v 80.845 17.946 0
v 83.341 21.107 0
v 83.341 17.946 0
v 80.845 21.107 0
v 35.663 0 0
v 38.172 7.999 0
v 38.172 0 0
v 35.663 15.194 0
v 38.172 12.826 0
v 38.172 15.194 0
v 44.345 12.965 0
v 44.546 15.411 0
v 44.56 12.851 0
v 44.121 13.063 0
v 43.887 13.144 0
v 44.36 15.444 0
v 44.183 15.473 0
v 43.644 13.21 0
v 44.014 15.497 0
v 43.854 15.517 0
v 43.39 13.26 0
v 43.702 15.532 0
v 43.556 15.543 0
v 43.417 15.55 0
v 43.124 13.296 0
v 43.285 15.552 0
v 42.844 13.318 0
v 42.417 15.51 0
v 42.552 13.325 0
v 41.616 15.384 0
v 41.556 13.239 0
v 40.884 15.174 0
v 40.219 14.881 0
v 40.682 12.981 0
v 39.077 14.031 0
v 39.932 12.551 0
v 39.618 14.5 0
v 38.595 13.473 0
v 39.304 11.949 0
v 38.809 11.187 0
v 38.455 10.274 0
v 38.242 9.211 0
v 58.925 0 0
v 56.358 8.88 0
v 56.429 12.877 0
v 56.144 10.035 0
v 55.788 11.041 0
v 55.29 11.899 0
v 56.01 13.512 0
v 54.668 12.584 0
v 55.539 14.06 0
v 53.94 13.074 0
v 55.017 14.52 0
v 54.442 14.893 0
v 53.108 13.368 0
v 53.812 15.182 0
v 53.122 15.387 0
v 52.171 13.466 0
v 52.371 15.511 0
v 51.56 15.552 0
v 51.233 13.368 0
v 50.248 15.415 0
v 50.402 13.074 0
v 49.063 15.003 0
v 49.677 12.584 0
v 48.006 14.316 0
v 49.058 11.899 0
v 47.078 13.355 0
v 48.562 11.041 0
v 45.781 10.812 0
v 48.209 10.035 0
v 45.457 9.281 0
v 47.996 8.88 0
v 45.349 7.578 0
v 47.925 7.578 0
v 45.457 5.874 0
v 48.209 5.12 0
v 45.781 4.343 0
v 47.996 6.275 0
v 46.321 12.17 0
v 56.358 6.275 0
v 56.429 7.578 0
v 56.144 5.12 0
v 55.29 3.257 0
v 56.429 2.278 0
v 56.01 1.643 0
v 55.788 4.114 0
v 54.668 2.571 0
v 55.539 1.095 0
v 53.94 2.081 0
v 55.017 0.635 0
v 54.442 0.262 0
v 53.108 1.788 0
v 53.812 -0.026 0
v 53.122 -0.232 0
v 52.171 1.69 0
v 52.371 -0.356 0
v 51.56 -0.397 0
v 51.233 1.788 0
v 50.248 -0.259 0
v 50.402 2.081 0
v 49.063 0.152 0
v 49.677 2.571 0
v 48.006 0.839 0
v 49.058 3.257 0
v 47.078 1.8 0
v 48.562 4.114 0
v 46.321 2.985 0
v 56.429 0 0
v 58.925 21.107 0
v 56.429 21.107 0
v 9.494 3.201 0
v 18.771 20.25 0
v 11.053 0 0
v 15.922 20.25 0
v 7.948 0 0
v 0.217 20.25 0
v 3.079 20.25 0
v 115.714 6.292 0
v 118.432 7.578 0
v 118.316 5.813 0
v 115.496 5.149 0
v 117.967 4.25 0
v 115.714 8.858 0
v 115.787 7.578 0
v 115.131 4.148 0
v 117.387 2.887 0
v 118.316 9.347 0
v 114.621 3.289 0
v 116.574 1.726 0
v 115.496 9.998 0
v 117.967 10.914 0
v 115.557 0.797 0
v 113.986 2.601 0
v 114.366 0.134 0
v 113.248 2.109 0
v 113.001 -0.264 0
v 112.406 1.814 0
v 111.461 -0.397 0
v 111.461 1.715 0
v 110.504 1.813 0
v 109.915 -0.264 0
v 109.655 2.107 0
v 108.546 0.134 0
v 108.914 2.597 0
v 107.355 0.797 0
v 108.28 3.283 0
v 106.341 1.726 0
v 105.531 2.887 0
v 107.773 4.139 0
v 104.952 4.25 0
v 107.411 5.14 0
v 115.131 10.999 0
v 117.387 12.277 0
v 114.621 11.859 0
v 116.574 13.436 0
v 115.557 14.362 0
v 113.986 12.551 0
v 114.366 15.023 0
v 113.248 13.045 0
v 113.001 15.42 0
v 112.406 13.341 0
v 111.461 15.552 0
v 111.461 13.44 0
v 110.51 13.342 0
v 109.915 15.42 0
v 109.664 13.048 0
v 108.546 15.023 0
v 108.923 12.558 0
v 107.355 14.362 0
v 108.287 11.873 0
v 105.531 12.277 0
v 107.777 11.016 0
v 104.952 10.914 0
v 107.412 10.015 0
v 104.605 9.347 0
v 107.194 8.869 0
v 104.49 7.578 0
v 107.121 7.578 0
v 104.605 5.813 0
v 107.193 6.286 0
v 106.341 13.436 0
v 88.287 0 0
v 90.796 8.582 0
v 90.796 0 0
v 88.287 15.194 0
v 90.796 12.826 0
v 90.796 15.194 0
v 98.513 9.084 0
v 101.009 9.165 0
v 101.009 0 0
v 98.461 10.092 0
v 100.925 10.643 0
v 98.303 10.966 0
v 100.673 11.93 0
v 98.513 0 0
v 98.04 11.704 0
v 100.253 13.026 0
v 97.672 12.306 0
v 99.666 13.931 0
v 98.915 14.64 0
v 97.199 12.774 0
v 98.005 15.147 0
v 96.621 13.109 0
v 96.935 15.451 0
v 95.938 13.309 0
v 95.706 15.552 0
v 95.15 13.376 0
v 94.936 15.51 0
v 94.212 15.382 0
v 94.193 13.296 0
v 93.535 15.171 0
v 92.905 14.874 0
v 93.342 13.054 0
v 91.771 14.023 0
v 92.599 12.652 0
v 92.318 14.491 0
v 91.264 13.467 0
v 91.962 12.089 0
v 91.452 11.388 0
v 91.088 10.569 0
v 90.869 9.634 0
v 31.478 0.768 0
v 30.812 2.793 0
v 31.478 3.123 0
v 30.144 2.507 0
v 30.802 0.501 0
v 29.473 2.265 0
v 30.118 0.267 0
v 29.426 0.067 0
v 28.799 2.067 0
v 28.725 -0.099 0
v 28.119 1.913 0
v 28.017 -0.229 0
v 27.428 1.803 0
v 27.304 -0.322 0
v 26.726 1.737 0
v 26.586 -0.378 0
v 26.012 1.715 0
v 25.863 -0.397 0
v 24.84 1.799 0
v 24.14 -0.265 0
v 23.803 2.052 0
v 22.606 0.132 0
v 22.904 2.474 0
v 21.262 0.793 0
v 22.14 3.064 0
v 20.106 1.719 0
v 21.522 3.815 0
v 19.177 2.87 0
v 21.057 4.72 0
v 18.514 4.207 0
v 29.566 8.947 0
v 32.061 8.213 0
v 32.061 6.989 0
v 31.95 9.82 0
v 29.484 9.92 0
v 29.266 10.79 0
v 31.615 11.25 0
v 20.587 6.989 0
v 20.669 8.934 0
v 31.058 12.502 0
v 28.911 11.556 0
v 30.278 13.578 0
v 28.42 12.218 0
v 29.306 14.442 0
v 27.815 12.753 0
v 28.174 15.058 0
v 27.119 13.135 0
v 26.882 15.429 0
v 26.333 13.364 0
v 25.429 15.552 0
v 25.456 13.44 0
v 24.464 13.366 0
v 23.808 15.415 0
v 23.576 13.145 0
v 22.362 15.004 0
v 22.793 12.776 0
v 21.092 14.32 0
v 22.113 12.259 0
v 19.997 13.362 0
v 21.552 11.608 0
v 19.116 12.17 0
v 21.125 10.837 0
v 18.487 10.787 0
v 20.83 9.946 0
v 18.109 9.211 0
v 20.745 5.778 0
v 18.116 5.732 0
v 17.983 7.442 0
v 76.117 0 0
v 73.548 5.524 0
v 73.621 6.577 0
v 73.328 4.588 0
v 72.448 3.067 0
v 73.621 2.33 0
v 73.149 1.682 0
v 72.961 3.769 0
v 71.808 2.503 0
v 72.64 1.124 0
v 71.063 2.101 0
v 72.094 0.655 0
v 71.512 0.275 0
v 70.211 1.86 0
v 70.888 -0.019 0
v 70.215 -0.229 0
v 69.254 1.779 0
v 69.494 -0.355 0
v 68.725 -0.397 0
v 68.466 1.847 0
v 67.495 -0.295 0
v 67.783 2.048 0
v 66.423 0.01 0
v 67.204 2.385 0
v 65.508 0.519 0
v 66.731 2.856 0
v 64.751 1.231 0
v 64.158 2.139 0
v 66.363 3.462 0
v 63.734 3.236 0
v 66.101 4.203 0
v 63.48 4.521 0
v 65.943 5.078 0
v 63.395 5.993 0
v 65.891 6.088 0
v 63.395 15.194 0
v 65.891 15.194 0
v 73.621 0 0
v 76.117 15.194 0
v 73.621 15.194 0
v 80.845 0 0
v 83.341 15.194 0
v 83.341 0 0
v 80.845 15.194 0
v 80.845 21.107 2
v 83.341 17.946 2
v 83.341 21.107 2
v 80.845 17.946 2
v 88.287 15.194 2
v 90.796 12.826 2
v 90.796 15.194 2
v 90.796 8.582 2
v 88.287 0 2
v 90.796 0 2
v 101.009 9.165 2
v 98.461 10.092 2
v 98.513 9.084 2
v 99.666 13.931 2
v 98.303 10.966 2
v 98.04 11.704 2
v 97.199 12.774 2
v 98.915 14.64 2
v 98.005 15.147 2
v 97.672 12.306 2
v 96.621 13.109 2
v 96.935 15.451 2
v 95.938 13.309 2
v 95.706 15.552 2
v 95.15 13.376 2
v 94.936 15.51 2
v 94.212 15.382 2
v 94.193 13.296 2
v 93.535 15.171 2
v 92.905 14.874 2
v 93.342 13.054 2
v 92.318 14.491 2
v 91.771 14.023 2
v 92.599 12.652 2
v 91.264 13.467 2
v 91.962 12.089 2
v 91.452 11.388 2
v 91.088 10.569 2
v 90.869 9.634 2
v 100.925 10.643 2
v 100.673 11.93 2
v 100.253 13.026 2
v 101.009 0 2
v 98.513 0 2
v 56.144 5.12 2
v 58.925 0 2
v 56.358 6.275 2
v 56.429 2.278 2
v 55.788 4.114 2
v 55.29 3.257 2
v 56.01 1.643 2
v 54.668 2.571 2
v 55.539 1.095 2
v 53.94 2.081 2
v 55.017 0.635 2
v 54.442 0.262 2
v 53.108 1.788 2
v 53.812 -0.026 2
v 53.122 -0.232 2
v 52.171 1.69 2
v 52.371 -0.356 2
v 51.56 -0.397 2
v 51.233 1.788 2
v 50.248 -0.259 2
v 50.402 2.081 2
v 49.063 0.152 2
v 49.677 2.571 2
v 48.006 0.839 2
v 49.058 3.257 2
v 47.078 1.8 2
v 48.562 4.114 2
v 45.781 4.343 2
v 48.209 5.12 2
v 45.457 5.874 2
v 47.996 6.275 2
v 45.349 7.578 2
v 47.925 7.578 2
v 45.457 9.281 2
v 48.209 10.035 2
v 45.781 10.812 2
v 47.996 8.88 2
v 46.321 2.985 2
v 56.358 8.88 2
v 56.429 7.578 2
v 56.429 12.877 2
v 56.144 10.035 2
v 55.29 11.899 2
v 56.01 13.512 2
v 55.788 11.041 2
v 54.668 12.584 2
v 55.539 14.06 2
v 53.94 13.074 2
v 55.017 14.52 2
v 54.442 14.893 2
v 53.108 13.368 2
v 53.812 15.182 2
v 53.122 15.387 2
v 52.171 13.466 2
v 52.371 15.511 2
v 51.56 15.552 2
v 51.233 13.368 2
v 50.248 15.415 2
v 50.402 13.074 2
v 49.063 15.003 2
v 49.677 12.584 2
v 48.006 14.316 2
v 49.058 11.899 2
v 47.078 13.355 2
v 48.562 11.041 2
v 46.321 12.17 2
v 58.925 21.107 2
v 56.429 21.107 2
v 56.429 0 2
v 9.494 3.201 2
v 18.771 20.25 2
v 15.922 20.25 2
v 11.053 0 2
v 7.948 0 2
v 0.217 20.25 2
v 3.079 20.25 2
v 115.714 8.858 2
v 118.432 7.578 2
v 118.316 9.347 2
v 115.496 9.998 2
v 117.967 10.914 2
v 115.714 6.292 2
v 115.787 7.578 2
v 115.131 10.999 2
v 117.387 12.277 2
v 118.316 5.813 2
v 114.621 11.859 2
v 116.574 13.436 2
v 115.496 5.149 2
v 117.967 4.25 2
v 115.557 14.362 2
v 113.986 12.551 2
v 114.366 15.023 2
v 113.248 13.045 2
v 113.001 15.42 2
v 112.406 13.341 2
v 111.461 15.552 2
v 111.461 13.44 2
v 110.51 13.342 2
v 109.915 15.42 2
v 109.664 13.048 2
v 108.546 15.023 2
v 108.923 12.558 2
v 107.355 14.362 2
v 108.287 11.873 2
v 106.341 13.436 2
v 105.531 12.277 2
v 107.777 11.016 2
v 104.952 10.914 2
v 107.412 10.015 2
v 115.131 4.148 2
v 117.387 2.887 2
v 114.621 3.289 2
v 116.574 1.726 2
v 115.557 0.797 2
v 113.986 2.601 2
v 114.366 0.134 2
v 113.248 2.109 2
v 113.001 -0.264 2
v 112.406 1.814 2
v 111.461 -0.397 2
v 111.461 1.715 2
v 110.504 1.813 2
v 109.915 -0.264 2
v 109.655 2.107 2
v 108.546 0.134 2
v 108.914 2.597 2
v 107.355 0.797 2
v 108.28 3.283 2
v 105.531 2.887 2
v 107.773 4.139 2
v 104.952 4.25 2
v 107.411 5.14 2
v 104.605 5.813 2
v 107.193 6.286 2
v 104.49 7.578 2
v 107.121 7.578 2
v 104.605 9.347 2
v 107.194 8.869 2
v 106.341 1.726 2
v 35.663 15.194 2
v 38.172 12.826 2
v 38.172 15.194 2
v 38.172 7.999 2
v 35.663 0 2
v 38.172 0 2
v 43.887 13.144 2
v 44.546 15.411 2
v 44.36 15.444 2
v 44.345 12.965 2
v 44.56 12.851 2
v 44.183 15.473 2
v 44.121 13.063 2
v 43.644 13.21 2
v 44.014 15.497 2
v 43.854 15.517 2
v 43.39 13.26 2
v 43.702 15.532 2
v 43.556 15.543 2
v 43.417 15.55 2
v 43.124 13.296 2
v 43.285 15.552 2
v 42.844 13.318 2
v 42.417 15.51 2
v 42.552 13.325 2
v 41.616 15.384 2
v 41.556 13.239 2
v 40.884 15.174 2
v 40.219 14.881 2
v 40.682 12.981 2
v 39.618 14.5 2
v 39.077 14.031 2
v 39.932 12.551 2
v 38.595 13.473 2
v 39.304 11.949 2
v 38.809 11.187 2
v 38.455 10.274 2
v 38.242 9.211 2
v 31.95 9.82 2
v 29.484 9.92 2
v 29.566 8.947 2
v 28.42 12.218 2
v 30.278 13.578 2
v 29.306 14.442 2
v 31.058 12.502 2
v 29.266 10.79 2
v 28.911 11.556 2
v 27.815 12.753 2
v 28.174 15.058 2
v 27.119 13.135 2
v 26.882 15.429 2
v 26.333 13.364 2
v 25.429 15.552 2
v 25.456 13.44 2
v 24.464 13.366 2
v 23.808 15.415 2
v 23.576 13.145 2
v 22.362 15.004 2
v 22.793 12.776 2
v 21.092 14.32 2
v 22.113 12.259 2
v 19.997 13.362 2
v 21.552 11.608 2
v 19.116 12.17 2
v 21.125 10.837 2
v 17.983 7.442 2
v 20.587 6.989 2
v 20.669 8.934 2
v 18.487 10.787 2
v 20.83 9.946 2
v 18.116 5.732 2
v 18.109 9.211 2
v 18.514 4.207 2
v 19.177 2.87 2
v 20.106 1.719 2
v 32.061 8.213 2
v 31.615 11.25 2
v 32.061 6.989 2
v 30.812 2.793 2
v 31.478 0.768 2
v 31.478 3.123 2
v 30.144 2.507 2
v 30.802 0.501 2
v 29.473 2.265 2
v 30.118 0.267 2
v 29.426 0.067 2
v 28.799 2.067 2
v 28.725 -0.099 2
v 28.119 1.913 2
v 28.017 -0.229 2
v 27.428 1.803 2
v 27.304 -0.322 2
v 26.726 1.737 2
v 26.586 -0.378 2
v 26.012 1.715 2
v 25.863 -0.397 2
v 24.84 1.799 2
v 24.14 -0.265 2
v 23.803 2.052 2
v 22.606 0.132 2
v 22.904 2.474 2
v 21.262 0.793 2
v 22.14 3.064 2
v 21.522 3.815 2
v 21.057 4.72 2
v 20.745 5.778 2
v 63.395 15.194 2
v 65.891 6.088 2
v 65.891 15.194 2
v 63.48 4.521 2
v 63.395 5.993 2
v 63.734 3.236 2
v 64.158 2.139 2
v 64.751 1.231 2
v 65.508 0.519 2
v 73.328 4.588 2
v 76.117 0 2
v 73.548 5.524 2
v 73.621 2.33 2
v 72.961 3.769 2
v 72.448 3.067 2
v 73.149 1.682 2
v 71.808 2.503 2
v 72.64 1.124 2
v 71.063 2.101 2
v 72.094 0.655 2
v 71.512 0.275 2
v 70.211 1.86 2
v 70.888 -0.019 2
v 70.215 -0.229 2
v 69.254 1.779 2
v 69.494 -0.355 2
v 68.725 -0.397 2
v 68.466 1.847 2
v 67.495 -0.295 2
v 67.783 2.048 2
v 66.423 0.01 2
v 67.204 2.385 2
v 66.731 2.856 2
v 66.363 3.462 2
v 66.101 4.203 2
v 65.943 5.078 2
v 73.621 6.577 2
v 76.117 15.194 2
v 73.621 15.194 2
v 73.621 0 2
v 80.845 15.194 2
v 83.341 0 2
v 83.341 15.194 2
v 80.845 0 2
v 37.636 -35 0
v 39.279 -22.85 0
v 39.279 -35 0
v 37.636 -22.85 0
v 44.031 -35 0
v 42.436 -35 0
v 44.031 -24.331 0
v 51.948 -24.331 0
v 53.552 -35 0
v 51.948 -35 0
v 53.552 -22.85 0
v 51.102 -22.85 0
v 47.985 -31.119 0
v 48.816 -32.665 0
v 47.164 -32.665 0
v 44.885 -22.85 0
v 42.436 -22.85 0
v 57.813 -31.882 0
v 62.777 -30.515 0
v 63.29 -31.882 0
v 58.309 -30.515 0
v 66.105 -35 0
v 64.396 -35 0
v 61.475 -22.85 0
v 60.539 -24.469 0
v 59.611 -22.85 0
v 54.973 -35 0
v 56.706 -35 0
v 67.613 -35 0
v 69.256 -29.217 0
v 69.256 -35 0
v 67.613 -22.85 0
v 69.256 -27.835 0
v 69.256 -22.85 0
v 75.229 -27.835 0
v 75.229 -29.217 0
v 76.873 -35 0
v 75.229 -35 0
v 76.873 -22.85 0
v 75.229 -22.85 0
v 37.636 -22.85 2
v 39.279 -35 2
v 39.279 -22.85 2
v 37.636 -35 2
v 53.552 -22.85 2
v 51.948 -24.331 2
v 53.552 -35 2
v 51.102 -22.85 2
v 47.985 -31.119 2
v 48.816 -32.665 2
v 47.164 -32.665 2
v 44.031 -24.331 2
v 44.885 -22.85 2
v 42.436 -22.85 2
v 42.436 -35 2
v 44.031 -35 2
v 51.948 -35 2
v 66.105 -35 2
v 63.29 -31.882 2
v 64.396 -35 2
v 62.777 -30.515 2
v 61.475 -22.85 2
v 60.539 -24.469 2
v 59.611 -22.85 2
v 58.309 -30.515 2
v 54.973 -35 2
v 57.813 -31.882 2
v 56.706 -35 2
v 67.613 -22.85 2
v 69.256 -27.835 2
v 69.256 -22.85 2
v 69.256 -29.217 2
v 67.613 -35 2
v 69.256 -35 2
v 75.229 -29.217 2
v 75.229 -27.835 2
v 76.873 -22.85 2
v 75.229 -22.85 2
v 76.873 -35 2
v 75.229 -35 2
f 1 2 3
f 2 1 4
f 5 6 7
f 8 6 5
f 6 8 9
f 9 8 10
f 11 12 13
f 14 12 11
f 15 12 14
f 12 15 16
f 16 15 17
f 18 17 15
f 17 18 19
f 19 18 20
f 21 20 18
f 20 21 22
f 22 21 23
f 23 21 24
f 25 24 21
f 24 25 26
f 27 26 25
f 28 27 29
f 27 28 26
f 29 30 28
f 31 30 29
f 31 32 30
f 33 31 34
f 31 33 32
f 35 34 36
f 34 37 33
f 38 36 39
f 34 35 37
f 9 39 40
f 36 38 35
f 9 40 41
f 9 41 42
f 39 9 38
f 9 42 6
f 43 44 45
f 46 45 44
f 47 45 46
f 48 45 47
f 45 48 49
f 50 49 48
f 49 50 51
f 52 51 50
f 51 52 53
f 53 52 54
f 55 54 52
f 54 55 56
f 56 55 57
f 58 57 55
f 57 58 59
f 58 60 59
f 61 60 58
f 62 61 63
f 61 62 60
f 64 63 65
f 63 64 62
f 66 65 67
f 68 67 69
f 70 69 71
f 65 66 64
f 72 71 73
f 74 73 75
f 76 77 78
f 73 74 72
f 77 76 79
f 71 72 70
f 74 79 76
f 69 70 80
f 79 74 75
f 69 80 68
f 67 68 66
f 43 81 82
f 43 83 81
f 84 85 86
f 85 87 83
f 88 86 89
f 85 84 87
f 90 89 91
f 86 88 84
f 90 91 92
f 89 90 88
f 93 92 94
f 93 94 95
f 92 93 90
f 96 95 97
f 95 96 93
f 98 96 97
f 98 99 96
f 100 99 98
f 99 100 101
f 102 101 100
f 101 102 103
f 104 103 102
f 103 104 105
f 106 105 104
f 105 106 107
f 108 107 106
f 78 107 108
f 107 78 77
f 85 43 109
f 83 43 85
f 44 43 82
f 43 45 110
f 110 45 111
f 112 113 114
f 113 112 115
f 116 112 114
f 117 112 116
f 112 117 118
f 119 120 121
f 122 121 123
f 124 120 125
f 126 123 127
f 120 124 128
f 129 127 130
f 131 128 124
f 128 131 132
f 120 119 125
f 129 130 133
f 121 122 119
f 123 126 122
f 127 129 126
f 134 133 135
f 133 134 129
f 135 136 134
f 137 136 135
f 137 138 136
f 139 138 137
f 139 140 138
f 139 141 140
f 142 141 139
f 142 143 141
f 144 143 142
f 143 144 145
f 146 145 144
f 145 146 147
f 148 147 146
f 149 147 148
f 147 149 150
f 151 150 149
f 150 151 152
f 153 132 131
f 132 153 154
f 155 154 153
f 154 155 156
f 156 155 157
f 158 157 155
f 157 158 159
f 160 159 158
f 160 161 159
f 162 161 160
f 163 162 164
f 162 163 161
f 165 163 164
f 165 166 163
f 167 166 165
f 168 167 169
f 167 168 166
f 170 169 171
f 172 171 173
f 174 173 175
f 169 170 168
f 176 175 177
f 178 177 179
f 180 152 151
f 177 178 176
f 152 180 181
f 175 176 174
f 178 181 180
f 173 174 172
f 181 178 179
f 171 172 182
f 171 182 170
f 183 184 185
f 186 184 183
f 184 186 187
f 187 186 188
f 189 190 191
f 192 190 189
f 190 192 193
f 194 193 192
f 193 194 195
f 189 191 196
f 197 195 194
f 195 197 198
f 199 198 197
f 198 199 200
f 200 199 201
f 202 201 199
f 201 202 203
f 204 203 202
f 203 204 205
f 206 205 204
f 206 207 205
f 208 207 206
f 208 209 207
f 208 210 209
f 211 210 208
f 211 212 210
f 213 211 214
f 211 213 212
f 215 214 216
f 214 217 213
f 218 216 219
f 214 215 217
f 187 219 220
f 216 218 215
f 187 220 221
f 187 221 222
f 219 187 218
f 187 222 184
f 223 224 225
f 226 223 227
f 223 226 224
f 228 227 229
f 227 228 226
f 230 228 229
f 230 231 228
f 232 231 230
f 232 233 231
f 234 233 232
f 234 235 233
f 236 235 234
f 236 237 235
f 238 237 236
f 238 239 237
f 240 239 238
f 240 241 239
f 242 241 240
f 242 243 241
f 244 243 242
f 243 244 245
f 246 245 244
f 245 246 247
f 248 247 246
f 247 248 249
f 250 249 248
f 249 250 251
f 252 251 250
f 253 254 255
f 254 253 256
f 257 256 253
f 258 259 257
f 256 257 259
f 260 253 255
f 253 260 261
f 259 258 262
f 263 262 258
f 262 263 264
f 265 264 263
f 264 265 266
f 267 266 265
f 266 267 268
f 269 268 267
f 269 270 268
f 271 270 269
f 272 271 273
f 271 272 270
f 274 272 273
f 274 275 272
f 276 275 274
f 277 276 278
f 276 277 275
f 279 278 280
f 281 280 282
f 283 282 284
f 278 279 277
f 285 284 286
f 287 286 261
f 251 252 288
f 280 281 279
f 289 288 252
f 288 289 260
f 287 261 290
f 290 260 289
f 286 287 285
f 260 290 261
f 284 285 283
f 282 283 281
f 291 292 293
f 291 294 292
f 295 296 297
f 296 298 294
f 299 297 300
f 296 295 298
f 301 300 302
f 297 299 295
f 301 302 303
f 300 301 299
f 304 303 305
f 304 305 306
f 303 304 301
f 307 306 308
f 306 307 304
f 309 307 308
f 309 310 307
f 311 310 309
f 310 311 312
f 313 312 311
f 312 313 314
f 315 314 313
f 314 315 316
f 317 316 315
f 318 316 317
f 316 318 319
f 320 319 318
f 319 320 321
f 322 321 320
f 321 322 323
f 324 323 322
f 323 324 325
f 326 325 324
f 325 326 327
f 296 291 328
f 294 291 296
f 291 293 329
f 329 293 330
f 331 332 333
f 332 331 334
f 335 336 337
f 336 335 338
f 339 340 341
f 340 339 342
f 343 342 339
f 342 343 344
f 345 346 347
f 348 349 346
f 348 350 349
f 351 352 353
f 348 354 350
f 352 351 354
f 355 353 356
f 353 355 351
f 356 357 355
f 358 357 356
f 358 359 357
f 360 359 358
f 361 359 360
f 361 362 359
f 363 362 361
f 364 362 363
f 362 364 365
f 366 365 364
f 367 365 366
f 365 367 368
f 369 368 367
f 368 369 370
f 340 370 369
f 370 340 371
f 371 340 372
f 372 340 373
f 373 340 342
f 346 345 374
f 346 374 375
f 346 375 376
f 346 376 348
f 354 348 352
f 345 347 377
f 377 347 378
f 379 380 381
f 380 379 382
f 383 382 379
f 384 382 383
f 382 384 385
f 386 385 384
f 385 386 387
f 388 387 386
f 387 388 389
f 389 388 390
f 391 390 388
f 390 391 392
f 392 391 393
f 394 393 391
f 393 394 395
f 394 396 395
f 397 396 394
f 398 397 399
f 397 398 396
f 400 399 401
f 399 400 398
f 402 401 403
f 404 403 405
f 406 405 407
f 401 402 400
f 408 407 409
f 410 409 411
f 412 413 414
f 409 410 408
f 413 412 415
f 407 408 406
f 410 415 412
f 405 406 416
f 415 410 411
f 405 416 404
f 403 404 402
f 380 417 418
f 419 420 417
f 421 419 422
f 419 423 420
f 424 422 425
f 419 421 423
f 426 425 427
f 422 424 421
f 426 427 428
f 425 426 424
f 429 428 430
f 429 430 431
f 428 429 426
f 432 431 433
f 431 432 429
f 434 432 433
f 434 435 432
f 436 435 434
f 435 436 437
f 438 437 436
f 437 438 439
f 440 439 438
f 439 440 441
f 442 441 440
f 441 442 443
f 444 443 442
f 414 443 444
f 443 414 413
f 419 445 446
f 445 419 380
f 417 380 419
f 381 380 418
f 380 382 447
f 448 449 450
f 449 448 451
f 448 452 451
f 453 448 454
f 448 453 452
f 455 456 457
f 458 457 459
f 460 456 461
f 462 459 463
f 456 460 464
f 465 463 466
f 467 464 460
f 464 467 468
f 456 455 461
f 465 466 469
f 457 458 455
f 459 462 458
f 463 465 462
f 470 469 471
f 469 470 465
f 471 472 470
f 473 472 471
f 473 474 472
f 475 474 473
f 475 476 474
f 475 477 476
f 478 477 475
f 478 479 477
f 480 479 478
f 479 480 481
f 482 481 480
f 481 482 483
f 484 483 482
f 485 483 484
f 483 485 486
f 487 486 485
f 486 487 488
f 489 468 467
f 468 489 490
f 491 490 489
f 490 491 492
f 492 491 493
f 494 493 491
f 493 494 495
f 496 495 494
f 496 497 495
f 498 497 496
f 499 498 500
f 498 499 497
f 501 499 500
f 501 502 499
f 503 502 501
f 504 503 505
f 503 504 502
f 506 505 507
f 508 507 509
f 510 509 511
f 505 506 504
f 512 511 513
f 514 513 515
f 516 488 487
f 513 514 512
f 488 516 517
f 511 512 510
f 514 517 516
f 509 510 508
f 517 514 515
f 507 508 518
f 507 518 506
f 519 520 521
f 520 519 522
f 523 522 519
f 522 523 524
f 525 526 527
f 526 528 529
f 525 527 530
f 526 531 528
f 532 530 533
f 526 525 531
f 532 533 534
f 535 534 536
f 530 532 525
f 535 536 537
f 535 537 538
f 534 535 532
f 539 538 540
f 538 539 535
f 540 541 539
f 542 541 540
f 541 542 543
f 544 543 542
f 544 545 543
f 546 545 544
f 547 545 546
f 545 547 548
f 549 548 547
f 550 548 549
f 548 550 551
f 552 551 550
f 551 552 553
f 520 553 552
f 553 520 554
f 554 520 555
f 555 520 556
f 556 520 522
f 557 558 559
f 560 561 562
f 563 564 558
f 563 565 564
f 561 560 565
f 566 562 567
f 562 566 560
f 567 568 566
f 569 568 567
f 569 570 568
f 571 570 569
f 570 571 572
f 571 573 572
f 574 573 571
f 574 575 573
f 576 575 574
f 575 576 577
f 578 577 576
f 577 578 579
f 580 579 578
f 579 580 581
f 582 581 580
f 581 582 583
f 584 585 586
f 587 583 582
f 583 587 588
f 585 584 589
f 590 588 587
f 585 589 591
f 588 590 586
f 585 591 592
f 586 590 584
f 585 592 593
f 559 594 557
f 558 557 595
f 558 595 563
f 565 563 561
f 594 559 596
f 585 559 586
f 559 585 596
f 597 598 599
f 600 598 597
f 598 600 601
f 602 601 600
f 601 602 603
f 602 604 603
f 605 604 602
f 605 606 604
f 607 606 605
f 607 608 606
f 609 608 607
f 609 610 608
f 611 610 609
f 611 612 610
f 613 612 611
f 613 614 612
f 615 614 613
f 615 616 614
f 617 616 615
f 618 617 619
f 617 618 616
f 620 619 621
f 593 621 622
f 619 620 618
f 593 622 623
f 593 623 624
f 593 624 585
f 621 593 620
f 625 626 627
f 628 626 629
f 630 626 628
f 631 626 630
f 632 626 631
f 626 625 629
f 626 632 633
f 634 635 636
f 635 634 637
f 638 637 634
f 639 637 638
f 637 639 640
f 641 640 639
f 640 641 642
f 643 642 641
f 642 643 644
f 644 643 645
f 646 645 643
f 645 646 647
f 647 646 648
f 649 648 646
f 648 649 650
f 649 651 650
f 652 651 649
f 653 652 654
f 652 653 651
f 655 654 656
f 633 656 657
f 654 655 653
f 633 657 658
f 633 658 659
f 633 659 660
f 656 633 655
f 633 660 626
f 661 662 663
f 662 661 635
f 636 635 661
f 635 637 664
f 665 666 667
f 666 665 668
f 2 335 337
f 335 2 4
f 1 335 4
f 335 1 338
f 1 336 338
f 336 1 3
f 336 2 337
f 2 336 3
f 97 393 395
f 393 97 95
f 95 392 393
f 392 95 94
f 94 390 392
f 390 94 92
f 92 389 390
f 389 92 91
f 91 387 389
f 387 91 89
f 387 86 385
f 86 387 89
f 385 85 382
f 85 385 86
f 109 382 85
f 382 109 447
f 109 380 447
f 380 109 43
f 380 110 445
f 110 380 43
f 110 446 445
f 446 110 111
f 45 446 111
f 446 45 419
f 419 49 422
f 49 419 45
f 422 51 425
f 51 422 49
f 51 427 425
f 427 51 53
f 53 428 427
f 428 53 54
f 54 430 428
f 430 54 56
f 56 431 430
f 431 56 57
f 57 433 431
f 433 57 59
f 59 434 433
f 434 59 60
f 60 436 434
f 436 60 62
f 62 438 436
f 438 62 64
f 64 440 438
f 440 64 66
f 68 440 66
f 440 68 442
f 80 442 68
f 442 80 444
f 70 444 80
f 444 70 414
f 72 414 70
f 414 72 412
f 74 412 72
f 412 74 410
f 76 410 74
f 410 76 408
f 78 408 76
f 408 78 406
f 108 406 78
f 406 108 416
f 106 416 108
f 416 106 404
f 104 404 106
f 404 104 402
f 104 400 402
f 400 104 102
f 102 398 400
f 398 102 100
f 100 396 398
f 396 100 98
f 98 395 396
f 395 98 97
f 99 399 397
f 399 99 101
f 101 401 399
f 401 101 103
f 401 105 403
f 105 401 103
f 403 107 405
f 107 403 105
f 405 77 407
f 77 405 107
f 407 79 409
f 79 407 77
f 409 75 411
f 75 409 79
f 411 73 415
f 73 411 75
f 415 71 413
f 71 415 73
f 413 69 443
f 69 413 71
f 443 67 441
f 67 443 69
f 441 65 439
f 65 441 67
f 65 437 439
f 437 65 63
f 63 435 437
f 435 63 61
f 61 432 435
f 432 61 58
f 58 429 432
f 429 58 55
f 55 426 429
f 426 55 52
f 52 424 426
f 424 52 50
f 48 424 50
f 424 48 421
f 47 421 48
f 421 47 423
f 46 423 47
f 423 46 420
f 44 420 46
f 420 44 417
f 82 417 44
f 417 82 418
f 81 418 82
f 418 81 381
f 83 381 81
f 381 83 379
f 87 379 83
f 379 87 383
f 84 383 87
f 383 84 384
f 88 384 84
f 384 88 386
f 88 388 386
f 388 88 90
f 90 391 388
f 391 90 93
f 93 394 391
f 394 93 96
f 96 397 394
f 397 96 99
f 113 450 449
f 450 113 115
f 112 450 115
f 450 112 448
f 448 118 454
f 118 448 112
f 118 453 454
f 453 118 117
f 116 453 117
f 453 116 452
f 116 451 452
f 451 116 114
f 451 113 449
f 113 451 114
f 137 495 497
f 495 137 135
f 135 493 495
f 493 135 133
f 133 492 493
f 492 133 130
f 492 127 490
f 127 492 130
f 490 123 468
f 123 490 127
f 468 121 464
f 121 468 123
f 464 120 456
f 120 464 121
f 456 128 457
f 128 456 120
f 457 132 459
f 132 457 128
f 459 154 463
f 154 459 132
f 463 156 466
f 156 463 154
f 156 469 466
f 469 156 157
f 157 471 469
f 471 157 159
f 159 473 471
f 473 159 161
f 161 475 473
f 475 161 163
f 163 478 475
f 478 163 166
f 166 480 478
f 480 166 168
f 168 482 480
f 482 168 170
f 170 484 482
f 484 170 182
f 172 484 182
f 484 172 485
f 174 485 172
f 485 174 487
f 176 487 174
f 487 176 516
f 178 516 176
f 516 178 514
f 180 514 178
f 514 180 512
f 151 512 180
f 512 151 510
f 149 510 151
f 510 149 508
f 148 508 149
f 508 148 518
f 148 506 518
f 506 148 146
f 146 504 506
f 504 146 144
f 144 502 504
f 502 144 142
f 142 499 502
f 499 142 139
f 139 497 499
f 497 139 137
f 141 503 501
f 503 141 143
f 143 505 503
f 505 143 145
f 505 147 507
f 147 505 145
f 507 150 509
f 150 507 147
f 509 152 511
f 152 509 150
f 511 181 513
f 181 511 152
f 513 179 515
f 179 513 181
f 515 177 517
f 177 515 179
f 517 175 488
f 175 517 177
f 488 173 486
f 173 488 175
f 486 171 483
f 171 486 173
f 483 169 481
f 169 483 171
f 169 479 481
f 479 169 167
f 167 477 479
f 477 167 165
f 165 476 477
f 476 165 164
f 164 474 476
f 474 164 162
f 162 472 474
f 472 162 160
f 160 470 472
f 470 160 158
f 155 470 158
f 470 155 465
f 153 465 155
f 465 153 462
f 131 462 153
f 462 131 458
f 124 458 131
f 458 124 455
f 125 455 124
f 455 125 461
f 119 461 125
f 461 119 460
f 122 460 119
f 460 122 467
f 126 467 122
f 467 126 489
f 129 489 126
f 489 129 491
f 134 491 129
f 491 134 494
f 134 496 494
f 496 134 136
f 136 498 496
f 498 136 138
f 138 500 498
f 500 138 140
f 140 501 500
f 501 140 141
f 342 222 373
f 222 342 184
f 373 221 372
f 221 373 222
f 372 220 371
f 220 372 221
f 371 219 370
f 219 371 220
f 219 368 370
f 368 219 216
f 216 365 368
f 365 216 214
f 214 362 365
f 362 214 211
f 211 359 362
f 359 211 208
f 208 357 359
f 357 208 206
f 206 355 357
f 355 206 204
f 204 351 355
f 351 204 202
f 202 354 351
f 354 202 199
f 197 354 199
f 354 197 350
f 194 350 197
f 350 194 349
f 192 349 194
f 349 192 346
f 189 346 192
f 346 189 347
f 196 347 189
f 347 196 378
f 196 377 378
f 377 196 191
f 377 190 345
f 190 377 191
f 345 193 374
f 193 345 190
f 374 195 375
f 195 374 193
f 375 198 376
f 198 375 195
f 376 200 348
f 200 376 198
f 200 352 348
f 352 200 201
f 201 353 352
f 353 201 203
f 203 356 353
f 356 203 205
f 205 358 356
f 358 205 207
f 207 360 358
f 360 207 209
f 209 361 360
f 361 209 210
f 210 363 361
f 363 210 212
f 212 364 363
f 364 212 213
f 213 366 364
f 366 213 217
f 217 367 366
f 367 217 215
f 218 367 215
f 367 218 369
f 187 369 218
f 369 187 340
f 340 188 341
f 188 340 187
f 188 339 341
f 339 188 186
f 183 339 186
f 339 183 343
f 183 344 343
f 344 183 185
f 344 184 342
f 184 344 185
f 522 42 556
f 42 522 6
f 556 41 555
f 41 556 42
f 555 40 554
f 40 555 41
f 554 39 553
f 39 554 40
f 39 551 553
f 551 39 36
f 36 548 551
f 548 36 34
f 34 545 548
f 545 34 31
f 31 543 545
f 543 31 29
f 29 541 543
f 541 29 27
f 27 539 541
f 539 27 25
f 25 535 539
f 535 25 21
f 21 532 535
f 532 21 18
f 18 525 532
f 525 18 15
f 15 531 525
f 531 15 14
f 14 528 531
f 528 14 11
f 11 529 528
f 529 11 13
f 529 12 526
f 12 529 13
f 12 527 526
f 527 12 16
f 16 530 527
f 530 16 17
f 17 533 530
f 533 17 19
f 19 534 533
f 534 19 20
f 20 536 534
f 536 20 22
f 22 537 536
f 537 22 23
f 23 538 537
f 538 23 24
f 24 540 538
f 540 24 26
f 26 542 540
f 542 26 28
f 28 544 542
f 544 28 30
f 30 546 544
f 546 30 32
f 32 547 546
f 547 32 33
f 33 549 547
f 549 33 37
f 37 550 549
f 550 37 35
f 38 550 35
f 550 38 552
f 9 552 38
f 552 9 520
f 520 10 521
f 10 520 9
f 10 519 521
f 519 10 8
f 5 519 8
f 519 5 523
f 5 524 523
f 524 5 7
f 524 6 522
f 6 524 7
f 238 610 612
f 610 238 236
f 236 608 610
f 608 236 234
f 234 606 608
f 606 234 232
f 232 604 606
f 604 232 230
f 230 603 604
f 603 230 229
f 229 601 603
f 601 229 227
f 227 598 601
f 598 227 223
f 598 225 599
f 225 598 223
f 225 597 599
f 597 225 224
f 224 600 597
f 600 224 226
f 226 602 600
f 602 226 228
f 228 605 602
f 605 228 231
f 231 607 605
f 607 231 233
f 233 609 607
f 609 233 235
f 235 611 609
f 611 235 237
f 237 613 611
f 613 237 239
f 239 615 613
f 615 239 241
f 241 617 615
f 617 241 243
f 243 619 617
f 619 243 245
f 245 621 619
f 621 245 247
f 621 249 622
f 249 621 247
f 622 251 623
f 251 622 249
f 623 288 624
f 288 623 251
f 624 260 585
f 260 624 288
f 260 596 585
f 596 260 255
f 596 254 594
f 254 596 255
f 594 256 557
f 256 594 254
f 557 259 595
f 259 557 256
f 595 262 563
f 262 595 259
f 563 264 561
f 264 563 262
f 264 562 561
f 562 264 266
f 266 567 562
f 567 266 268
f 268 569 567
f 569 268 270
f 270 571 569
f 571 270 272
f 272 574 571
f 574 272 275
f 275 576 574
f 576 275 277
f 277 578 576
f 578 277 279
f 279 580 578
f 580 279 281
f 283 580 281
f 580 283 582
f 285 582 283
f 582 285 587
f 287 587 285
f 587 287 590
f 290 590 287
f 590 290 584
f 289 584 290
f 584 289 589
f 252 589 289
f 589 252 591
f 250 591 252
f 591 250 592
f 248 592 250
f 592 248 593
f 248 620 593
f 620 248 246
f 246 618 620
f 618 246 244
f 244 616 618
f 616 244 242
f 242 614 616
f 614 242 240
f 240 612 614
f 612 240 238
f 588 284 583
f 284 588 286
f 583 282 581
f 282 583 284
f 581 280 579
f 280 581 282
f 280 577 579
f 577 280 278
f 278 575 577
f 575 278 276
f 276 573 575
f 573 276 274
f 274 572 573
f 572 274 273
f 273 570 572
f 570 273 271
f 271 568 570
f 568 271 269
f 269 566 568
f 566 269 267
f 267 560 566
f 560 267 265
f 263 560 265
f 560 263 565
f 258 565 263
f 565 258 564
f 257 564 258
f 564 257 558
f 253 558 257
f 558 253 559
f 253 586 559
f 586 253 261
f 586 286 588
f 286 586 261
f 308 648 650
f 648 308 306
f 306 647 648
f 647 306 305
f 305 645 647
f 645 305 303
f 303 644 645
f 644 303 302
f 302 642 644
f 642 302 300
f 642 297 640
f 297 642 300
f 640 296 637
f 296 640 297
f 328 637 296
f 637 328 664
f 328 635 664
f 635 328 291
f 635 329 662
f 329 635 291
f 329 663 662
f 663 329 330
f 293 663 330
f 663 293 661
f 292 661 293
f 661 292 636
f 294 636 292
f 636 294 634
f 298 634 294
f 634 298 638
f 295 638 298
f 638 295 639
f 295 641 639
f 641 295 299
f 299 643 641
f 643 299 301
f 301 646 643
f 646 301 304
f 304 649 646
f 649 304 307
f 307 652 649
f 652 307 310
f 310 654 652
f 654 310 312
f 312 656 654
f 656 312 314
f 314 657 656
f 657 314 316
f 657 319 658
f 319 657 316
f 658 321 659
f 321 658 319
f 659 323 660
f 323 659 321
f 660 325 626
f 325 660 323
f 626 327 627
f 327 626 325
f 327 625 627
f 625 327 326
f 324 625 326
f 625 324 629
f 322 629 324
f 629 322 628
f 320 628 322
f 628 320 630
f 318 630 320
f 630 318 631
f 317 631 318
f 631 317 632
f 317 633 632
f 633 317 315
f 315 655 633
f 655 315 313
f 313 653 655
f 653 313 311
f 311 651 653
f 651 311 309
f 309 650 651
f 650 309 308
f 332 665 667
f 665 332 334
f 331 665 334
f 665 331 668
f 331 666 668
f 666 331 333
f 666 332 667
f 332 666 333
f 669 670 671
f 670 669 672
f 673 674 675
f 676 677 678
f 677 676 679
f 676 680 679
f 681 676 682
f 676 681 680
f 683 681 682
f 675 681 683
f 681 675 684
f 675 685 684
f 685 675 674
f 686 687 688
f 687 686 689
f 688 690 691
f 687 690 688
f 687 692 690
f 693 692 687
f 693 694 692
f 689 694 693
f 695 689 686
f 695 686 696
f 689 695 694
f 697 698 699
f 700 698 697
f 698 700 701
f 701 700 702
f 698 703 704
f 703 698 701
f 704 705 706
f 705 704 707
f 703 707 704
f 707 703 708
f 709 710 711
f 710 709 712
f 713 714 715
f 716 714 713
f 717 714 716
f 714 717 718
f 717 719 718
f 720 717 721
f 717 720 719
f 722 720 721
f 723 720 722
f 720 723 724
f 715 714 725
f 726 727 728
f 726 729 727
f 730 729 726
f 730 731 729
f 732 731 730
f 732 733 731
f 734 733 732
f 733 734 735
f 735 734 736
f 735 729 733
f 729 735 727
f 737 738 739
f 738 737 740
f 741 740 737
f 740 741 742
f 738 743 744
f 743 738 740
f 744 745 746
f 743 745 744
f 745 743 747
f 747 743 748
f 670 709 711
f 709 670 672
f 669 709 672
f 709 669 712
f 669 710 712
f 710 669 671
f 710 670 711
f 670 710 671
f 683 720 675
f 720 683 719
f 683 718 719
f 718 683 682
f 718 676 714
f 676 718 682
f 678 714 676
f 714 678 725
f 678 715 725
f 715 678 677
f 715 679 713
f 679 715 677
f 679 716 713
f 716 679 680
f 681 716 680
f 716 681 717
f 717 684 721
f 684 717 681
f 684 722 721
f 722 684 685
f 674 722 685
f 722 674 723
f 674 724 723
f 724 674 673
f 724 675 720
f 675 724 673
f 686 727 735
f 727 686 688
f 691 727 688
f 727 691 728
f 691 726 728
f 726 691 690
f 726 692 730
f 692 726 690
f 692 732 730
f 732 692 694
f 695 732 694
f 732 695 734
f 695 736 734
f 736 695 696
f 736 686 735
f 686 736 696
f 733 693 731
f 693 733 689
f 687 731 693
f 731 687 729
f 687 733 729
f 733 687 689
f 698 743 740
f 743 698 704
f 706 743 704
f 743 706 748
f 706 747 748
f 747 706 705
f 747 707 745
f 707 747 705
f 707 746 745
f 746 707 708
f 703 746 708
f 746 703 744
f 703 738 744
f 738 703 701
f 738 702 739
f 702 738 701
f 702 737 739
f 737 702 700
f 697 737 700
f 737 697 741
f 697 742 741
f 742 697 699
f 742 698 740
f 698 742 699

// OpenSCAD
module Letras(escala=1,altura=1){

union(){
 linear_extrude(height=altura*2)
 text(size=20*escala,font = "Simplex","Verduino
 ");

 linear_extrude(height=altura*2)
 translate([36*escala,-35*escala,0])
 text(size=12*escala,font = "Simplex","IMAH");
 }//fin union letras
 
}

Letras();
